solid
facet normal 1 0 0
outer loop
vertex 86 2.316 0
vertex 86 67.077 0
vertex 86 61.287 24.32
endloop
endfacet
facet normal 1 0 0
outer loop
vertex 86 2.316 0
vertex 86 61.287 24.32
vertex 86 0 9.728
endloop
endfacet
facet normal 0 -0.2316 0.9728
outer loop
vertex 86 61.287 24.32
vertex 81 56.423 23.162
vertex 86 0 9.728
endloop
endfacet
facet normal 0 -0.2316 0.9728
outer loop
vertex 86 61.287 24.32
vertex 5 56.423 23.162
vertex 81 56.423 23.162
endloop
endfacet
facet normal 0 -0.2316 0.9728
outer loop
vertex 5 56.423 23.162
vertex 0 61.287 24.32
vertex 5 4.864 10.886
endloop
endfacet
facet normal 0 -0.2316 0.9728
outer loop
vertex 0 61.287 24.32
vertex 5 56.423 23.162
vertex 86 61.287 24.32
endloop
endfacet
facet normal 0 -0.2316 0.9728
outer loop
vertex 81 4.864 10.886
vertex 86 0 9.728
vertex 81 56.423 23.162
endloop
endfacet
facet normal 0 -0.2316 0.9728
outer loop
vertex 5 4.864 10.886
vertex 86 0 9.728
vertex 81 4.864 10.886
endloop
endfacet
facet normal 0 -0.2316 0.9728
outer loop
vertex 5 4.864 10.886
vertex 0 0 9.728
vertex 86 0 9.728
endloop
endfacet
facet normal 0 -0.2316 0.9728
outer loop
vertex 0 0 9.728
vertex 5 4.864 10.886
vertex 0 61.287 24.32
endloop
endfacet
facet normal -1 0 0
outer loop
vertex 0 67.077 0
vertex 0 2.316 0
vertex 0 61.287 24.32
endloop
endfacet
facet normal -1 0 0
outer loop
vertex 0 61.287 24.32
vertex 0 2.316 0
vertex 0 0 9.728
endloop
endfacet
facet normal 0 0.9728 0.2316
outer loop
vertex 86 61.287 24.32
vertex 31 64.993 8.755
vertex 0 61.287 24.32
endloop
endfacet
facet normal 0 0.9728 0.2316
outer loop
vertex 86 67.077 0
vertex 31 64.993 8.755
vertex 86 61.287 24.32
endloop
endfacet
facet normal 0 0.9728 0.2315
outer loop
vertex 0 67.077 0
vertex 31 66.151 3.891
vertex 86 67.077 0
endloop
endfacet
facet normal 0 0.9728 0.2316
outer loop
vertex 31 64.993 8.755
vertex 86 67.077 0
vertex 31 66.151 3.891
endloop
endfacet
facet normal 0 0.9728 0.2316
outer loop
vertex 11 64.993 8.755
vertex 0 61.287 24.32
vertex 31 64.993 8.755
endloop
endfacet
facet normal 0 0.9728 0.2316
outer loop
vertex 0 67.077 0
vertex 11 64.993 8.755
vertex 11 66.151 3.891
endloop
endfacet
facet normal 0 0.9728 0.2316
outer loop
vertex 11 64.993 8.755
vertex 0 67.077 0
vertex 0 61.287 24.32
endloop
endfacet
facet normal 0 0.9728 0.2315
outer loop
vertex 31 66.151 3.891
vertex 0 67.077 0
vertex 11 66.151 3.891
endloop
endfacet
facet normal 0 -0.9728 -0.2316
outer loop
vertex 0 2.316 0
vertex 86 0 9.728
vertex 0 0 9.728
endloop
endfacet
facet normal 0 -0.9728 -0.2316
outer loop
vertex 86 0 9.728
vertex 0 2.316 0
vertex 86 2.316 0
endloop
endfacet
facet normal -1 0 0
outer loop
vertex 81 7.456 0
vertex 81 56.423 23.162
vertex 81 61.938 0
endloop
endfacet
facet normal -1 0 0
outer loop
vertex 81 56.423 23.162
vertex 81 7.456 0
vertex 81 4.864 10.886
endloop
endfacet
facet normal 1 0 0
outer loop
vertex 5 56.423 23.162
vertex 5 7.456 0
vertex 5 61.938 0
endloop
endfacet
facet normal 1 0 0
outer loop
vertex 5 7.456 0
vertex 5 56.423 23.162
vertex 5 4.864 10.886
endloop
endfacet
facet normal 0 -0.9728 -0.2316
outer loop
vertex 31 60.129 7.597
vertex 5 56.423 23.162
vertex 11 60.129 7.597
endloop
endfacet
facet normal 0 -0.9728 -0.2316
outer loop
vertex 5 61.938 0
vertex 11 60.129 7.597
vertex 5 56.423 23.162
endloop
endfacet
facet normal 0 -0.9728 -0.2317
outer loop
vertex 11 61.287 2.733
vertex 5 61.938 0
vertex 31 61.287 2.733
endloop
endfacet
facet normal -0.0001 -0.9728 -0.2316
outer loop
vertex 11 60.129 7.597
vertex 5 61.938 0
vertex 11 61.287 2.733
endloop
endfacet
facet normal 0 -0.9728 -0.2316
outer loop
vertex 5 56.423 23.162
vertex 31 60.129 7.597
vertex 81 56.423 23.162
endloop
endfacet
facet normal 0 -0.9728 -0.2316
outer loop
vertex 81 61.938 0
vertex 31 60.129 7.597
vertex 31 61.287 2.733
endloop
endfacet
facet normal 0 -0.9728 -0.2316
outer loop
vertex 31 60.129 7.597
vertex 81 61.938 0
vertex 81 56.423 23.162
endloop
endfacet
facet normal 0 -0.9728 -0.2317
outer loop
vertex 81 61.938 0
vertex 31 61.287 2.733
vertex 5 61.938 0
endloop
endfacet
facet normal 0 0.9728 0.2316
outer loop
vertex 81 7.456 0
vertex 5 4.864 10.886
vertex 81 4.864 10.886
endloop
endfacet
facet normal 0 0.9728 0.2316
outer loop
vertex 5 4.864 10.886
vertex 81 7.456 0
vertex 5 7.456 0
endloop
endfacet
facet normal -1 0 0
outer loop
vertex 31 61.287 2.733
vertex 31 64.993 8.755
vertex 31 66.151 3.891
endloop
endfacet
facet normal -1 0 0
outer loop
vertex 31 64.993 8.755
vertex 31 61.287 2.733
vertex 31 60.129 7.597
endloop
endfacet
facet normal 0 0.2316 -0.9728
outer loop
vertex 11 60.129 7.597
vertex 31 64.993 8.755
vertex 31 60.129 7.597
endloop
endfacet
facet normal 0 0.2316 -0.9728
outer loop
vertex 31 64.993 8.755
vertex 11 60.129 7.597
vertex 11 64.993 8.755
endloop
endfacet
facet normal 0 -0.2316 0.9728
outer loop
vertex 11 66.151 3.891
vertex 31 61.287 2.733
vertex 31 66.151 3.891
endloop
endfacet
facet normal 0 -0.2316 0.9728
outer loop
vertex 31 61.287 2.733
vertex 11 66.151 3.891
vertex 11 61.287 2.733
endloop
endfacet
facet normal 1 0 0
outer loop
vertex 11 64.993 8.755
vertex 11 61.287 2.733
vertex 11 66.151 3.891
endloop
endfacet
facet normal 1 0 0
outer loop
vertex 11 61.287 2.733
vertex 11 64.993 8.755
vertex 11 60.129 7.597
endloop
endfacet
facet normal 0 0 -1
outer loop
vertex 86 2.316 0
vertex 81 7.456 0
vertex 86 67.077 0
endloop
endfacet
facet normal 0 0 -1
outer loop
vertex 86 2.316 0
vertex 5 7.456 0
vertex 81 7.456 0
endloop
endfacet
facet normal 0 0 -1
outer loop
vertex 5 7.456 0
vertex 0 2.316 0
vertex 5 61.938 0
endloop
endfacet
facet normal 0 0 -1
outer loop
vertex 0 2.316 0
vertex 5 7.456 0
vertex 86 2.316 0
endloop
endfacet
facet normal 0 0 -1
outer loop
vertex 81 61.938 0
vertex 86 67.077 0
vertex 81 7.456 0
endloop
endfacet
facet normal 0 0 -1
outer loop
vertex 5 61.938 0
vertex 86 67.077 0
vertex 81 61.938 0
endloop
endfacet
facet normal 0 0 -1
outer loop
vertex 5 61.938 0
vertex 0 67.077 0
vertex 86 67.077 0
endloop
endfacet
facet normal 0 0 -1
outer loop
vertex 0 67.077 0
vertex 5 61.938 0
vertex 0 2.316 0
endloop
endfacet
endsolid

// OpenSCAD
length = 76;
width = 53;
front_height = 10;
back_height = 25;
walls = 5;
back_slot_x_offset = 6;  // from side of thing that goes in box
back_slot_z_offset = 4;  // from base, at back
back_slot_x_length = 20;
back_slot_z_height = 5;

full_length = length+walls*2;
full_width = width+walls*2;
height_diff = back_height-front_height;
angle = atan2(height_diff, full_width);
diag_width = sqrt(full_width*full_width + height_diff*height_diff);
overhang = front_height*sin(angle);

intersection() {
    // the main hollow box, tilted so the front is lower than the back.
    translate([0, diag_width+overhang, 0]) rotate([angle, 0, 0])
      translate([0, -full_width, 0]) difference() {
        cube([full_length, full_width, back_height]);
        translate([walls, walls, -0.01]) cube([length, width, back_height+0.02]);
        translate([walls+back_slot_x_offset, width+walls-0.01, back_slot_z_offset])
          cube([back_slot_x_length, width+0.02, back_slot_z_height]);
    }
    // the bit above the Z plane...
    cube([full_length, diag_width+overhang, back_height]);
};
